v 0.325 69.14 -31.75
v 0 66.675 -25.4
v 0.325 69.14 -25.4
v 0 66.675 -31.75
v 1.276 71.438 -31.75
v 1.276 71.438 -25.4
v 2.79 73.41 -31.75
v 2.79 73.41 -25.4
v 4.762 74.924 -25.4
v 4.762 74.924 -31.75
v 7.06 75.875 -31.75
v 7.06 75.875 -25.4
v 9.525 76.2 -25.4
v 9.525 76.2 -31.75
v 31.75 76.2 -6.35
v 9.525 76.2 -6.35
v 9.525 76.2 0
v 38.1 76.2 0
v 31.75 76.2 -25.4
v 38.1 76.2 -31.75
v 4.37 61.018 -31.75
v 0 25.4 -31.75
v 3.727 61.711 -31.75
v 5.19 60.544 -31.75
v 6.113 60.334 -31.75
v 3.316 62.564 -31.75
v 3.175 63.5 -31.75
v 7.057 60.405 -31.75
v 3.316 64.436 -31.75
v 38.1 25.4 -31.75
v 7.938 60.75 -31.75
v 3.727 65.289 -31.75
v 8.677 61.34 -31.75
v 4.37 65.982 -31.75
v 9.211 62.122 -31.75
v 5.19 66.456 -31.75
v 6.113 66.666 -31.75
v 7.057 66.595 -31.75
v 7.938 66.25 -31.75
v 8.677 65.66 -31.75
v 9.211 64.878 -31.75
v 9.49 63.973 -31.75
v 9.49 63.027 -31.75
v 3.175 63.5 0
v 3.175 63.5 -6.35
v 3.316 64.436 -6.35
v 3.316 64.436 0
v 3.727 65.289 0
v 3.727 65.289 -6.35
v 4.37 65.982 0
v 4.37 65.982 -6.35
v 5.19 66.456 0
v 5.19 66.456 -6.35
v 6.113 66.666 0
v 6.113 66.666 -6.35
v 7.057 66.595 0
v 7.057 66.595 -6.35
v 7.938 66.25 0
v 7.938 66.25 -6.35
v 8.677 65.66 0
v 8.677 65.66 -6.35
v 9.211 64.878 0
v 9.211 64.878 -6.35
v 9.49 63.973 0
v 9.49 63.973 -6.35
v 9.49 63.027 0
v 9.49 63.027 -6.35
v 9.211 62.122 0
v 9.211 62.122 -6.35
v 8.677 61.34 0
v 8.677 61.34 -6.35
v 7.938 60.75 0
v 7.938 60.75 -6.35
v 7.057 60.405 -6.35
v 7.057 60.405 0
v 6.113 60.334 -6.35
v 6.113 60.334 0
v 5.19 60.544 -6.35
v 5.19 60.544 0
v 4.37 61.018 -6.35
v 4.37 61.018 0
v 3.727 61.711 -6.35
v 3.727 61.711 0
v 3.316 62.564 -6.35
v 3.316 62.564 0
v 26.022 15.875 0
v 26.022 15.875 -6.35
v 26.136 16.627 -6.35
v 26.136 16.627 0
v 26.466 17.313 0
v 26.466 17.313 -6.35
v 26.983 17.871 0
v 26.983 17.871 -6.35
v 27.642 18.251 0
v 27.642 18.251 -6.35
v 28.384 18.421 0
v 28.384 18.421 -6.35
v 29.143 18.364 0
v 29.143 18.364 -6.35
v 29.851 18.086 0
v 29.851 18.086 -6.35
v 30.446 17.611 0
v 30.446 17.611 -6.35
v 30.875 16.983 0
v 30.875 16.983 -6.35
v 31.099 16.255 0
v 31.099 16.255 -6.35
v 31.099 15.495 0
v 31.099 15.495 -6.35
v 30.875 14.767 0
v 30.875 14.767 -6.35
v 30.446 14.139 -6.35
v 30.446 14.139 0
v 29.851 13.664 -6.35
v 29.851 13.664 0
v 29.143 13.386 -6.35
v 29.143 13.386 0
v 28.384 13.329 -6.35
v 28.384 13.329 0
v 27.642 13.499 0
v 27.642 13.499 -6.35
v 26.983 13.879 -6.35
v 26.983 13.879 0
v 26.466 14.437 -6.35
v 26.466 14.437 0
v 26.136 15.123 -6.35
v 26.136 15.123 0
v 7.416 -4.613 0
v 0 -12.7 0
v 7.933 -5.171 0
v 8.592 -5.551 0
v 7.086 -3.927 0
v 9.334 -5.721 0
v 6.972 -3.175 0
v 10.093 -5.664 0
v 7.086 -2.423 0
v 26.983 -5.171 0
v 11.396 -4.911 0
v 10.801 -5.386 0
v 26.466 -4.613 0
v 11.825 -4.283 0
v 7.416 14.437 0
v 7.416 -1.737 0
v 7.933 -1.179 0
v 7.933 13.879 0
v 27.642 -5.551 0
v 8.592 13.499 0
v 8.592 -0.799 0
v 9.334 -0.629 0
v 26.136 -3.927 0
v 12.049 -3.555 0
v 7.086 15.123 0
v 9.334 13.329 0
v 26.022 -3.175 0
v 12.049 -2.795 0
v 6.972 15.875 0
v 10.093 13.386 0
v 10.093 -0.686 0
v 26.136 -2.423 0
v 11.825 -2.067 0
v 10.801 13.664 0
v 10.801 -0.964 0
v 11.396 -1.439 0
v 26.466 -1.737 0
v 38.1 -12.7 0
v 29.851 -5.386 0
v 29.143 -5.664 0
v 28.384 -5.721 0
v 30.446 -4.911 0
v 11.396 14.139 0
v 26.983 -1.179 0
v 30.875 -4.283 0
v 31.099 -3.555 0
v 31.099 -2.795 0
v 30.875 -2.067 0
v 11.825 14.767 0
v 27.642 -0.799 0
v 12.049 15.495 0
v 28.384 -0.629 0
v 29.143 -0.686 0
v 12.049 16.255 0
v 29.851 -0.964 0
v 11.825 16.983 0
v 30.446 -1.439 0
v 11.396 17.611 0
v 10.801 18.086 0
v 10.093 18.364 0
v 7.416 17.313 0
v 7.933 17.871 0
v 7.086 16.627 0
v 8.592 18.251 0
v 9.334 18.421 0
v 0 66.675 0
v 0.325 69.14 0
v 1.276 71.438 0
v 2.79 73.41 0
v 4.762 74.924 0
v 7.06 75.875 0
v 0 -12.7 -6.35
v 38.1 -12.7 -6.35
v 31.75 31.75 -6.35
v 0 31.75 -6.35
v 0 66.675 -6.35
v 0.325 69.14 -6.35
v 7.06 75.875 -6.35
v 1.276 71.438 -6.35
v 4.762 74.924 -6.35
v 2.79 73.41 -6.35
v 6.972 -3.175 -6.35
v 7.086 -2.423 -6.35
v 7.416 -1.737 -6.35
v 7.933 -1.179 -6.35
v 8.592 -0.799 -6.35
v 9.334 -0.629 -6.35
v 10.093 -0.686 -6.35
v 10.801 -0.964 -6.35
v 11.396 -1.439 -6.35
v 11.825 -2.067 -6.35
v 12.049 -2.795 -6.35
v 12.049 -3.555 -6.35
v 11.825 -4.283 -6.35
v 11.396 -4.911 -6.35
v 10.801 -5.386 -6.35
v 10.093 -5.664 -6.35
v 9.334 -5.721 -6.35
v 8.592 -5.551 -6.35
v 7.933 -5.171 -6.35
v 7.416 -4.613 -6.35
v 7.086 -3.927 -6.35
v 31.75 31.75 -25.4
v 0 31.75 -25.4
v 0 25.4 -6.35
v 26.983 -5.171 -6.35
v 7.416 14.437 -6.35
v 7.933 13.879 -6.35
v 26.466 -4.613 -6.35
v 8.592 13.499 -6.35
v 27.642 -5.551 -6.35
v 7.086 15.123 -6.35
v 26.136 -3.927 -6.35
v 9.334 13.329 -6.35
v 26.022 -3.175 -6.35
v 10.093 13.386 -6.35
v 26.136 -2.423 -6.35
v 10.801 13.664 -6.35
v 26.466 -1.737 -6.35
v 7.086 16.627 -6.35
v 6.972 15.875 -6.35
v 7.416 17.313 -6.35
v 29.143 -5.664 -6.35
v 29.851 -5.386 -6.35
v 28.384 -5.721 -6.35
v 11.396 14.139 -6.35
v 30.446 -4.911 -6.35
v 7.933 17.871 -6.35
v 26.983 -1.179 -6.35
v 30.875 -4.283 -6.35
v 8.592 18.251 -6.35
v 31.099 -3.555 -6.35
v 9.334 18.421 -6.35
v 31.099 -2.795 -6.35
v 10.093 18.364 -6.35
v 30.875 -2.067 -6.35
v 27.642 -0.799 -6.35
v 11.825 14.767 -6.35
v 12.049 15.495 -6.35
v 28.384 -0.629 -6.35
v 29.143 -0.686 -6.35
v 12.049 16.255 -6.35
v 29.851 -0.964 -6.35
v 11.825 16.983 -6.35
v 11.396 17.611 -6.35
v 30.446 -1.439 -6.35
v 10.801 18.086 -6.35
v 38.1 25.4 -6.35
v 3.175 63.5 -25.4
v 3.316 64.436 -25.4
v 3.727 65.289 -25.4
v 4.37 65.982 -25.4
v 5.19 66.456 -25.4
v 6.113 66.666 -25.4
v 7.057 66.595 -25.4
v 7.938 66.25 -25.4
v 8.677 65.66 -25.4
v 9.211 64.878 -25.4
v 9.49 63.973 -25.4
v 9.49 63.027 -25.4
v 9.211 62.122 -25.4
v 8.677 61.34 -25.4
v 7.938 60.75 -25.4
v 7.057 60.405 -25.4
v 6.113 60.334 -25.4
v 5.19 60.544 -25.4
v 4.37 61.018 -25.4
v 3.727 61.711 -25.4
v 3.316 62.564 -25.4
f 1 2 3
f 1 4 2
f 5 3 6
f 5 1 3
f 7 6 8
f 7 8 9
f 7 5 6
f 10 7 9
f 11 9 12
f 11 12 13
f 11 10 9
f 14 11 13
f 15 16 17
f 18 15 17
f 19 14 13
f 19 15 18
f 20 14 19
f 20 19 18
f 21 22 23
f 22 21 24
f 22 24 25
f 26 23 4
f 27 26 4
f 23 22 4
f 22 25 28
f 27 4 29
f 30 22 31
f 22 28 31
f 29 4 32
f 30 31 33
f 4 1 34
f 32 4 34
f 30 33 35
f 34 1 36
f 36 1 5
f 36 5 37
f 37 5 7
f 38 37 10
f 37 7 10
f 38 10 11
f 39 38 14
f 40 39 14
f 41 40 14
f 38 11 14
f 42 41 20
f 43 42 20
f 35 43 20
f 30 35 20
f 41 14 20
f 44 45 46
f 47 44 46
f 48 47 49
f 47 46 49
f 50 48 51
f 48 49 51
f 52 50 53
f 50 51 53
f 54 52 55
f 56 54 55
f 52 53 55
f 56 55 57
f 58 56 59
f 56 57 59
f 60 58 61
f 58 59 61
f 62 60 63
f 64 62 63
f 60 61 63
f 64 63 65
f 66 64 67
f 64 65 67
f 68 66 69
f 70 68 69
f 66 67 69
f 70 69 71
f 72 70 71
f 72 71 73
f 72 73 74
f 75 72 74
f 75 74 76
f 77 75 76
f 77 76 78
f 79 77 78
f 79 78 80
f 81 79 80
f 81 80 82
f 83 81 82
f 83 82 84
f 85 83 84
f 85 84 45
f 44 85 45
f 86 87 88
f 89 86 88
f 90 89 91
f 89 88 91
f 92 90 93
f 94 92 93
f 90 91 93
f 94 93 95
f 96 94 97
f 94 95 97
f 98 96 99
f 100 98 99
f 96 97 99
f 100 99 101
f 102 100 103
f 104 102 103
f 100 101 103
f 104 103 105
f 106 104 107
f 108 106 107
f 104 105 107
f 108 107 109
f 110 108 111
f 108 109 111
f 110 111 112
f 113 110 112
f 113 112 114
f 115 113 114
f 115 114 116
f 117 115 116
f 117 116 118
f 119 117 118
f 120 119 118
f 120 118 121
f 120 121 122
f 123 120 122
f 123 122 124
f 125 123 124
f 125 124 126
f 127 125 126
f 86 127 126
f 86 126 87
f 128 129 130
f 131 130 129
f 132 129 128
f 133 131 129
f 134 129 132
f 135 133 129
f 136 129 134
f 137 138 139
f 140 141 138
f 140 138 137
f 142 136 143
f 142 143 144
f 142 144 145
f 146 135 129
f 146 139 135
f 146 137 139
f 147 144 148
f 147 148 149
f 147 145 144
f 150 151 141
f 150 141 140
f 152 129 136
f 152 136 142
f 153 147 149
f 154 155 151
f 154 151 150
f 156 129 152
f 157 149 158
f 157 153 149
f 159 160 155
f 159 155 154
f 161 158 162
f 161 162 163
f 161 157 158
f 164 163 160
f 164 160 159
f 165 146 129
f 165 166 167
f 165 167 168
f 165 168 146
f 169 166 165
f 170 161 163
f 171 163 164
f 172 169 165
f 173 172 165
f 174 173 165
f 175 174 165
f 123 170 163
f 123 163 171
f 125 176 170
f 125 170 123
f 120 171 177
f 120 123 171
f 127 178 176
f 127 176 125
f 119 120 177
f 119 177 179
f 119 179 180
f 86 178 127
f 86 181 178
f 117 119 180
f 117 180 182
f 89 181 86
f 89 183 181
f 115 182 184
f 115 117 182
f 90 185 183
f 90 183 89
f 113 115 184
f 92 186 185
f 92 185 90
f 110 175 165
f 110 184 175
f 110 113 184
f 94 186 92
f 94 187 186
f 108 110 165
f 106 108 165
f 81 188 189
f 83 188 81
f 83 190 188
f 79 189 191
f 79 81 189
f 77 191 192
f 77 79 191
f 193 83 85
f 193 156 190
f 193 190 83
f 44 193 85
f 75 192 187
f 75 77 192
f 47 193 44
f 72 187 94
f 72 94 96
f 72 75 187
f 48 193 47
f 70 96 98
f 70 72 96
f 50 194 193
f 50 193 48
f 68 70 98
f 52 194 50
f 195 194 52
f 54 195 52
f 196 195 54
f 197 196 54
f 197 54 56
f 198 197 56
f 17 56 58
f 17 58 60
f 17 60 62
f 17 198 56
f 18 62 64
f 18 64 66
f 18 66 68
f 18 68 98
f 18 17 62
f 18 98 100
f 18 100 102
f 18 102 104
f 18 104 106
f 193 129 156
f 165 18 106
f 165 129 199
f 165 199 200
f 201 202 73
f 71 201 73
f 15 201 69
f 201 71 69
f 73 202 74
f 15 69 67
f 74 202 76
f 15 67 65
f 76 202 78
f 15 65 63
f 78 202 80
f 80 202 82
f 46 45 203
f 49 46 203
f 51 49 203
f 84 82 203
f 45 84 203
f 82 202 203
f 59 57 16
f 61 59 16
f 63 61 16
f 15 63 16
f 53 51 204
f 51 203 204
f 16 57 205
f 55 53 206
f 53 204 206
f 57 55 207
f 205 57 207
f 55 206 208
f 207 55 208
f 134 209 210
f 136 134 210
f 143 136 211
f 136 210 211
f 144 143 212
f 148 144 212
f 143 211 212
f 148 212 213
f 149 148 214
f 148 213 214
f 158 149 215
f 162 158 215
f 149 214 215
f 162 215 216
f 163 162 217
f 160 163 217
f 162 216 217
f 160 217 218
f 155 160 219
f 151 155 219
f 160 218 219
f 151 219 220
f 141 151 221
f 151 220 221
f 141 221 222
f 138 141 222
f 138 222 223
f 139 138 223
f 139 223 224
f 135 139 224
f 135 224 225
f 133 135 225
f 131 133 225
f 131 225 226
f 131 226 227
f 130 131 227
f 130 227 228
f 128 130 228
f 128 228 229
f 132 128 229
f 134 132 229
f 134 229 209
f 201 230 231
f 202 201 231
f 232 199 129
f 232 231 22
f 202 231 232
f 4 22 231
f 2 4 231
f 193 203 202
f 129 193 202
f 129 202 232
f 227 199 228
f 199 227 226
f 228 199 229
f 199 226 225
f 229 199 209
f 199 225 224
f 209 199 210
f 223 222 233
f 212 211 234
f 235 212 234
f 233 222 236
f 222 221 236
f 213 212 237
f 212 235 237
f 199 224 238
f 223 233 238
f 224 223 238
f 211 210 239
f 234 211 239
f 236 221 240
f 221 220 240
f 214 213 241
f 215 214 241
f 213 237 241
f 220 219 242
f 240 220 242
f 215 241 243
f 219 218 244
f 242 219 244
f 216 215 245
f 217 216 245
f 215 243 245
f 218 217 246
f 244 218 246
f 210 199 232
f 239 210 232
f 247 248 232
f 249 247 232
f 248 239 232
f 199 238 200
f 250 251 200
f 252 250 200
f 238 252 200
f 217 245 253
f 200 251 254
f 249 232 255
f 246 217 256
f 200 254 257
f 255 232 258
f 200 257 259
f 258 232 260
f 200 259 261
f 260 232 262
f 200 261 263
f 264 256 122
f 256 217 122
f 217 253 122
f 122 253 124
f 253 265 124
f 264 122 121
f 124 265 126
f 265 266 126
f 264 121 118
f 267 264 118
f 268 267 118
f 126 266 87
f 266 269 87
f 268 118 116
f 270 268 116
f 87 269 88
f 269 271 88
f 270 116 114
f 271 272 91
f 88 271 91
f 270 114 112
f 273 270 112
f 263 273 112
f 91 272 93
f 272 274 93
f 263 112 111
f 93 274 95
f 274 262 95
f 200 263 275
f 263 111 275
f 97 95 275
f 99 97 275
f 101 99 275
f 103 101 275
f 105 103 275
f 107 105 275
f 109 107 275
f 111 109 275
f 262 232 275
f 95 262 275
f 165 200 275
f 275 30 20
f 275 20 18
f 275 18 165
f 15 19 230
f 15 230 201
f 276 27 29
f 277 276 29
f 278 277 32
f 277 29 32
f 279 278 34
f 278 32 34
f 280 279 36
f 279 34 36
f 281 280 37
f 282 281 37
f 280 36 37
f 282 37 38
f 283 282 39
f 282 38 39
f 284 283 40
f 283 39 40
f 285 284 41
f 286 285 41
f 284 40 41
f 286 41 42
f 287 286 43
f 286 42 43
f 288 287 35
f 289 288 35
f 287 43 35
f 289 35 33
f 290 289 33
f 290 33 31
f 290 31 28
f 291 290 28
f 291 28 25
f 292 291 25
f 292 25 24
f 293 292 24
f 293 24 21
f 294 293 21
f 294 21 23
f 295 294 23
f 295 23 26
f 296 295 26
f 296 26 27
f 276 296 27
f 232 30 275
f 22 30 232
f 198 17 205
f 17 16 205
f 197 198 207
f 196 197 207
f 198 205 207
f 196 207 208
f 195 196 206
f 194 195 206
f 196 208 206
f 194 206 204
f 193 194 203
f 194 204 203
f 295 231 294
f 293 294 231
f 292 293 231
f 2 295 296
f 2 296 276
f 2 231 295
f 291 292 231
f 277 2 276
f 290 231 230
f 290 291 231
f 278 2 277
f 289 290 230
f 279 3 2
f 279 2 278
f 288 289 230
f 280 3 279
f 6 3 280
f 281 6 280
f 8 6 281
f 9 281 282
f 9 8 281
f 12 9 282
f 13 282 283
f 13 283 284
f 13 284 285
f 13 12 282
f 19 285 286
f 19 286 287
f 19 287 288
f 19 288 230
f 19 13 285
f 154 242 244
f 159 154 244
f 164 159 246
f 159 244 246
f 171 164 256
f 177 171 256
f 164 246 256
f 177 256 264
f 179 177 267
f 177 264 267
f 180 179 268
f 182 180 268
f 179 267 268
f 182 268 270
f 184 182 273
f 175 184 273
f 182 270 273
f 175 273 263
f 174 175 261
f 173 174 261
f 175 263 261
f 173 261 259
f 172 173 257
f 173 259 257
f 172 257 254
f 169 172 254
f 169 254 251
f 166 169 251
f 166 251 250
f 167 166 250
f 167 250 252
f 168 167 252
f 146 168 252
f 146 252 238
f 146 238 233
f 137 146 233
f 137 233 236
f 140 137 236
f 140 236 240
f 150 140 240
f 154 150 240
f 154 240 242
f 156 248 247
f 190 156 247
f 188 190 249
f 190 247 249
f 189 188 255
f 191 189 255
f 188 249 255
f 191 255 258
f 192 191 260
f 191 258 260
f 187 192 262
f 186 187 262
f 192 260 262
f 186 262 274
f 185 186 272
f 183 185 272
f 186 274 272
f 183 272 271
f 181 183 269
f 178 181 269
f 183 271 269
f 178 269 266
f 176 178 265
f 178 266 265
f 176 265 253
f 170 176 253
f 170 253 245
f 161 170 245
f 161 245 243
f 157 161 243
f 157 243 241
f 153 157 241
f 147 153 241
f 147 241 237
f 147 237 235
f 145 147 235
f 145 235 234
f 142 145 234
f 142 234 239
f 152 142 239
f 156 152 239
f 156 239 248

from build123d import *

# Parameters (mm, degrees)
SKETCH1_W                   = 38.1
SKETCH1_H                   = 76.2
BOSS_EXTRUDE1_DEPTH         = 31.75
SKETCH3_W                   = 25.4
SKETCH3_H                   = 76.2
CUT_EXTRUDE2_DEPTH          = 31.75
SKETCH4_W                   = 25.4
SKETCH4_H                   = 25.4
CUT_EXTRUDE3_DEPTH          = 89.44526556
SKETCH5_W                   = 31.75
SKETCH5_H                   = 6.35
BOSS_EXTRUDE2_DEPTH         = 50.8
SKETCH6_R                   = 3.175
CUT_EXTRUDE4_DEPTH          = 50.8
FILLET2_R                   = 9.525
SKETCH7_W                   = 31.75
SKETCH7_H                   = 19.05
BOSS_EXTRUDE3_DEPTH         = 6.35
SKETCH11_W                  = 38.1
SKETCH11_H                  = 6.35
BOSS_EXTRUDE4_DEPTH         = 12.7
F_1_4_20_TAPPED_HOLE2_D     = 5.1054
F_1_4_20_TAPPED_HOLE2_DEPTH = 16.51
F_1_4_20_TAPPED_HOLE2_TIP   = 1.533816902


with BuildPart() as part:
    # Sketch1 → Boss-Extrude1 (new body)
    with BuildSketch(Plane.XY):
        with Locations((19.05, 38.1)):
            Rectangle(SKETCH1_W, SKETCH1_H)
    extrude(amount=-BOSS_EXTRUDE1_DEPTH)

    # Sketch3 → Cut-Extrude2 (cut)
    with BuildSketch(Plane.ZY):
        with Locations((-19.05, 38.1)):
            Rectangle(SKETCH3_W, SKETCH3_H)
    extrude(amount=-CUT_EXTRUDE2_DEPTH, mode=Mode.SUBTRACT)

    # Sketch4 → Cut-Extrude3 (cut, through all)
    with BuildSketch(Plane.ZY.offset(-31.75)):
        with Locations((-19.05, 12.7)):
            Rectangle(SKETCH4_W, SKETCH4_H)
    extrude(amount=-CUT_EXTRUDE3_DEPTH, mode=Mode.SUBTRACT)

    # Sketch5 → Boss-Extrude2 (add)
    with BuildSketch(Plane(origin=(0, 76.2, 0), x_dir=(1, 0, 0), z_dir=(0, 1, 0))):
        with Locations((15.875, 28.575)):
            Rectangle(SKETCH5_W, SKETCH5_H)
    extrude(amount=-BOSS_EXTRUDE2_DEPTH)

    # Sketch6 → Cut-Extrude4 (cut)
    with BuildSketch(Plane(origin=(0, 0, -31.75), x_dir=(-1, 0, 0), z_dir=(0, 0, -1))):
        with Locations((-6.35, 63.5)):
            Circle(SKETCH6_R)
    extrude(amount=-CUT_EXTRUDE4_DEPTH, mode=Mode.SUBTRACT)

    # Fillet2
    fillet2_edges = [part.edges().sort_by_distance(p)[0] for p in [
        (0, 76.2, -3.175),
        (0, 76.2, -28.575),
    ]]
    fillet(fillet2_edges, radius=FILLET2_R)

    # Sketch7 → Boss-Extrude3 (add)
    with BuildSketch(Plane(origin=(0, 25.4, 0), x_dir=(-1, 0, 0), z_dir=(0, -1, 0))):
        with Locations((-15.875, 15.875)):
            Rectangle(SKETCH7_W, SKETCH7_H)
    extrude(amount=-BOSS_EXTRUDE3_DEPTH)

    # Sketch11 → Boss-Extrude4 (add)
    with BuildSketch(Plane.XZ):
        with Locations((19.05, -3.175)):
            Rectangle(SKETCH11_W, SKETCH11_H)
    extrude(amount=BOSS_EXTRUDE4_DEPTH)

    # 1/4-20 Tapped Hole2
    with Locations(Plane(origin=(9.525, -3.175, 0), x_dir=(1, 0, 0), z_dir=(0, 0, 1))):
        with Locations((0, 0), (19.05, 0), (0, 19.05), (19.05, 19.05)):
            Hole(F_1_4_20_TAPPED_HOLE2_D / 2, depth=F_1_4_20_TAPPED_HOLE2_DEPTH)
            with Locations((0, 0, -(F_1_4_20_TAPPED_HOLE2_DEPTH + F_1_4_20_TAPPED_HOLE2_TIP / 2))):  # 118° drill point
                Cone(0, F_1_4_20_TAPPED_HOLE2_D / 2, F_1_4_20_TAPPED_HOLE2_TIP, mode=Mode.SUBTRACT)


solid = part.part
